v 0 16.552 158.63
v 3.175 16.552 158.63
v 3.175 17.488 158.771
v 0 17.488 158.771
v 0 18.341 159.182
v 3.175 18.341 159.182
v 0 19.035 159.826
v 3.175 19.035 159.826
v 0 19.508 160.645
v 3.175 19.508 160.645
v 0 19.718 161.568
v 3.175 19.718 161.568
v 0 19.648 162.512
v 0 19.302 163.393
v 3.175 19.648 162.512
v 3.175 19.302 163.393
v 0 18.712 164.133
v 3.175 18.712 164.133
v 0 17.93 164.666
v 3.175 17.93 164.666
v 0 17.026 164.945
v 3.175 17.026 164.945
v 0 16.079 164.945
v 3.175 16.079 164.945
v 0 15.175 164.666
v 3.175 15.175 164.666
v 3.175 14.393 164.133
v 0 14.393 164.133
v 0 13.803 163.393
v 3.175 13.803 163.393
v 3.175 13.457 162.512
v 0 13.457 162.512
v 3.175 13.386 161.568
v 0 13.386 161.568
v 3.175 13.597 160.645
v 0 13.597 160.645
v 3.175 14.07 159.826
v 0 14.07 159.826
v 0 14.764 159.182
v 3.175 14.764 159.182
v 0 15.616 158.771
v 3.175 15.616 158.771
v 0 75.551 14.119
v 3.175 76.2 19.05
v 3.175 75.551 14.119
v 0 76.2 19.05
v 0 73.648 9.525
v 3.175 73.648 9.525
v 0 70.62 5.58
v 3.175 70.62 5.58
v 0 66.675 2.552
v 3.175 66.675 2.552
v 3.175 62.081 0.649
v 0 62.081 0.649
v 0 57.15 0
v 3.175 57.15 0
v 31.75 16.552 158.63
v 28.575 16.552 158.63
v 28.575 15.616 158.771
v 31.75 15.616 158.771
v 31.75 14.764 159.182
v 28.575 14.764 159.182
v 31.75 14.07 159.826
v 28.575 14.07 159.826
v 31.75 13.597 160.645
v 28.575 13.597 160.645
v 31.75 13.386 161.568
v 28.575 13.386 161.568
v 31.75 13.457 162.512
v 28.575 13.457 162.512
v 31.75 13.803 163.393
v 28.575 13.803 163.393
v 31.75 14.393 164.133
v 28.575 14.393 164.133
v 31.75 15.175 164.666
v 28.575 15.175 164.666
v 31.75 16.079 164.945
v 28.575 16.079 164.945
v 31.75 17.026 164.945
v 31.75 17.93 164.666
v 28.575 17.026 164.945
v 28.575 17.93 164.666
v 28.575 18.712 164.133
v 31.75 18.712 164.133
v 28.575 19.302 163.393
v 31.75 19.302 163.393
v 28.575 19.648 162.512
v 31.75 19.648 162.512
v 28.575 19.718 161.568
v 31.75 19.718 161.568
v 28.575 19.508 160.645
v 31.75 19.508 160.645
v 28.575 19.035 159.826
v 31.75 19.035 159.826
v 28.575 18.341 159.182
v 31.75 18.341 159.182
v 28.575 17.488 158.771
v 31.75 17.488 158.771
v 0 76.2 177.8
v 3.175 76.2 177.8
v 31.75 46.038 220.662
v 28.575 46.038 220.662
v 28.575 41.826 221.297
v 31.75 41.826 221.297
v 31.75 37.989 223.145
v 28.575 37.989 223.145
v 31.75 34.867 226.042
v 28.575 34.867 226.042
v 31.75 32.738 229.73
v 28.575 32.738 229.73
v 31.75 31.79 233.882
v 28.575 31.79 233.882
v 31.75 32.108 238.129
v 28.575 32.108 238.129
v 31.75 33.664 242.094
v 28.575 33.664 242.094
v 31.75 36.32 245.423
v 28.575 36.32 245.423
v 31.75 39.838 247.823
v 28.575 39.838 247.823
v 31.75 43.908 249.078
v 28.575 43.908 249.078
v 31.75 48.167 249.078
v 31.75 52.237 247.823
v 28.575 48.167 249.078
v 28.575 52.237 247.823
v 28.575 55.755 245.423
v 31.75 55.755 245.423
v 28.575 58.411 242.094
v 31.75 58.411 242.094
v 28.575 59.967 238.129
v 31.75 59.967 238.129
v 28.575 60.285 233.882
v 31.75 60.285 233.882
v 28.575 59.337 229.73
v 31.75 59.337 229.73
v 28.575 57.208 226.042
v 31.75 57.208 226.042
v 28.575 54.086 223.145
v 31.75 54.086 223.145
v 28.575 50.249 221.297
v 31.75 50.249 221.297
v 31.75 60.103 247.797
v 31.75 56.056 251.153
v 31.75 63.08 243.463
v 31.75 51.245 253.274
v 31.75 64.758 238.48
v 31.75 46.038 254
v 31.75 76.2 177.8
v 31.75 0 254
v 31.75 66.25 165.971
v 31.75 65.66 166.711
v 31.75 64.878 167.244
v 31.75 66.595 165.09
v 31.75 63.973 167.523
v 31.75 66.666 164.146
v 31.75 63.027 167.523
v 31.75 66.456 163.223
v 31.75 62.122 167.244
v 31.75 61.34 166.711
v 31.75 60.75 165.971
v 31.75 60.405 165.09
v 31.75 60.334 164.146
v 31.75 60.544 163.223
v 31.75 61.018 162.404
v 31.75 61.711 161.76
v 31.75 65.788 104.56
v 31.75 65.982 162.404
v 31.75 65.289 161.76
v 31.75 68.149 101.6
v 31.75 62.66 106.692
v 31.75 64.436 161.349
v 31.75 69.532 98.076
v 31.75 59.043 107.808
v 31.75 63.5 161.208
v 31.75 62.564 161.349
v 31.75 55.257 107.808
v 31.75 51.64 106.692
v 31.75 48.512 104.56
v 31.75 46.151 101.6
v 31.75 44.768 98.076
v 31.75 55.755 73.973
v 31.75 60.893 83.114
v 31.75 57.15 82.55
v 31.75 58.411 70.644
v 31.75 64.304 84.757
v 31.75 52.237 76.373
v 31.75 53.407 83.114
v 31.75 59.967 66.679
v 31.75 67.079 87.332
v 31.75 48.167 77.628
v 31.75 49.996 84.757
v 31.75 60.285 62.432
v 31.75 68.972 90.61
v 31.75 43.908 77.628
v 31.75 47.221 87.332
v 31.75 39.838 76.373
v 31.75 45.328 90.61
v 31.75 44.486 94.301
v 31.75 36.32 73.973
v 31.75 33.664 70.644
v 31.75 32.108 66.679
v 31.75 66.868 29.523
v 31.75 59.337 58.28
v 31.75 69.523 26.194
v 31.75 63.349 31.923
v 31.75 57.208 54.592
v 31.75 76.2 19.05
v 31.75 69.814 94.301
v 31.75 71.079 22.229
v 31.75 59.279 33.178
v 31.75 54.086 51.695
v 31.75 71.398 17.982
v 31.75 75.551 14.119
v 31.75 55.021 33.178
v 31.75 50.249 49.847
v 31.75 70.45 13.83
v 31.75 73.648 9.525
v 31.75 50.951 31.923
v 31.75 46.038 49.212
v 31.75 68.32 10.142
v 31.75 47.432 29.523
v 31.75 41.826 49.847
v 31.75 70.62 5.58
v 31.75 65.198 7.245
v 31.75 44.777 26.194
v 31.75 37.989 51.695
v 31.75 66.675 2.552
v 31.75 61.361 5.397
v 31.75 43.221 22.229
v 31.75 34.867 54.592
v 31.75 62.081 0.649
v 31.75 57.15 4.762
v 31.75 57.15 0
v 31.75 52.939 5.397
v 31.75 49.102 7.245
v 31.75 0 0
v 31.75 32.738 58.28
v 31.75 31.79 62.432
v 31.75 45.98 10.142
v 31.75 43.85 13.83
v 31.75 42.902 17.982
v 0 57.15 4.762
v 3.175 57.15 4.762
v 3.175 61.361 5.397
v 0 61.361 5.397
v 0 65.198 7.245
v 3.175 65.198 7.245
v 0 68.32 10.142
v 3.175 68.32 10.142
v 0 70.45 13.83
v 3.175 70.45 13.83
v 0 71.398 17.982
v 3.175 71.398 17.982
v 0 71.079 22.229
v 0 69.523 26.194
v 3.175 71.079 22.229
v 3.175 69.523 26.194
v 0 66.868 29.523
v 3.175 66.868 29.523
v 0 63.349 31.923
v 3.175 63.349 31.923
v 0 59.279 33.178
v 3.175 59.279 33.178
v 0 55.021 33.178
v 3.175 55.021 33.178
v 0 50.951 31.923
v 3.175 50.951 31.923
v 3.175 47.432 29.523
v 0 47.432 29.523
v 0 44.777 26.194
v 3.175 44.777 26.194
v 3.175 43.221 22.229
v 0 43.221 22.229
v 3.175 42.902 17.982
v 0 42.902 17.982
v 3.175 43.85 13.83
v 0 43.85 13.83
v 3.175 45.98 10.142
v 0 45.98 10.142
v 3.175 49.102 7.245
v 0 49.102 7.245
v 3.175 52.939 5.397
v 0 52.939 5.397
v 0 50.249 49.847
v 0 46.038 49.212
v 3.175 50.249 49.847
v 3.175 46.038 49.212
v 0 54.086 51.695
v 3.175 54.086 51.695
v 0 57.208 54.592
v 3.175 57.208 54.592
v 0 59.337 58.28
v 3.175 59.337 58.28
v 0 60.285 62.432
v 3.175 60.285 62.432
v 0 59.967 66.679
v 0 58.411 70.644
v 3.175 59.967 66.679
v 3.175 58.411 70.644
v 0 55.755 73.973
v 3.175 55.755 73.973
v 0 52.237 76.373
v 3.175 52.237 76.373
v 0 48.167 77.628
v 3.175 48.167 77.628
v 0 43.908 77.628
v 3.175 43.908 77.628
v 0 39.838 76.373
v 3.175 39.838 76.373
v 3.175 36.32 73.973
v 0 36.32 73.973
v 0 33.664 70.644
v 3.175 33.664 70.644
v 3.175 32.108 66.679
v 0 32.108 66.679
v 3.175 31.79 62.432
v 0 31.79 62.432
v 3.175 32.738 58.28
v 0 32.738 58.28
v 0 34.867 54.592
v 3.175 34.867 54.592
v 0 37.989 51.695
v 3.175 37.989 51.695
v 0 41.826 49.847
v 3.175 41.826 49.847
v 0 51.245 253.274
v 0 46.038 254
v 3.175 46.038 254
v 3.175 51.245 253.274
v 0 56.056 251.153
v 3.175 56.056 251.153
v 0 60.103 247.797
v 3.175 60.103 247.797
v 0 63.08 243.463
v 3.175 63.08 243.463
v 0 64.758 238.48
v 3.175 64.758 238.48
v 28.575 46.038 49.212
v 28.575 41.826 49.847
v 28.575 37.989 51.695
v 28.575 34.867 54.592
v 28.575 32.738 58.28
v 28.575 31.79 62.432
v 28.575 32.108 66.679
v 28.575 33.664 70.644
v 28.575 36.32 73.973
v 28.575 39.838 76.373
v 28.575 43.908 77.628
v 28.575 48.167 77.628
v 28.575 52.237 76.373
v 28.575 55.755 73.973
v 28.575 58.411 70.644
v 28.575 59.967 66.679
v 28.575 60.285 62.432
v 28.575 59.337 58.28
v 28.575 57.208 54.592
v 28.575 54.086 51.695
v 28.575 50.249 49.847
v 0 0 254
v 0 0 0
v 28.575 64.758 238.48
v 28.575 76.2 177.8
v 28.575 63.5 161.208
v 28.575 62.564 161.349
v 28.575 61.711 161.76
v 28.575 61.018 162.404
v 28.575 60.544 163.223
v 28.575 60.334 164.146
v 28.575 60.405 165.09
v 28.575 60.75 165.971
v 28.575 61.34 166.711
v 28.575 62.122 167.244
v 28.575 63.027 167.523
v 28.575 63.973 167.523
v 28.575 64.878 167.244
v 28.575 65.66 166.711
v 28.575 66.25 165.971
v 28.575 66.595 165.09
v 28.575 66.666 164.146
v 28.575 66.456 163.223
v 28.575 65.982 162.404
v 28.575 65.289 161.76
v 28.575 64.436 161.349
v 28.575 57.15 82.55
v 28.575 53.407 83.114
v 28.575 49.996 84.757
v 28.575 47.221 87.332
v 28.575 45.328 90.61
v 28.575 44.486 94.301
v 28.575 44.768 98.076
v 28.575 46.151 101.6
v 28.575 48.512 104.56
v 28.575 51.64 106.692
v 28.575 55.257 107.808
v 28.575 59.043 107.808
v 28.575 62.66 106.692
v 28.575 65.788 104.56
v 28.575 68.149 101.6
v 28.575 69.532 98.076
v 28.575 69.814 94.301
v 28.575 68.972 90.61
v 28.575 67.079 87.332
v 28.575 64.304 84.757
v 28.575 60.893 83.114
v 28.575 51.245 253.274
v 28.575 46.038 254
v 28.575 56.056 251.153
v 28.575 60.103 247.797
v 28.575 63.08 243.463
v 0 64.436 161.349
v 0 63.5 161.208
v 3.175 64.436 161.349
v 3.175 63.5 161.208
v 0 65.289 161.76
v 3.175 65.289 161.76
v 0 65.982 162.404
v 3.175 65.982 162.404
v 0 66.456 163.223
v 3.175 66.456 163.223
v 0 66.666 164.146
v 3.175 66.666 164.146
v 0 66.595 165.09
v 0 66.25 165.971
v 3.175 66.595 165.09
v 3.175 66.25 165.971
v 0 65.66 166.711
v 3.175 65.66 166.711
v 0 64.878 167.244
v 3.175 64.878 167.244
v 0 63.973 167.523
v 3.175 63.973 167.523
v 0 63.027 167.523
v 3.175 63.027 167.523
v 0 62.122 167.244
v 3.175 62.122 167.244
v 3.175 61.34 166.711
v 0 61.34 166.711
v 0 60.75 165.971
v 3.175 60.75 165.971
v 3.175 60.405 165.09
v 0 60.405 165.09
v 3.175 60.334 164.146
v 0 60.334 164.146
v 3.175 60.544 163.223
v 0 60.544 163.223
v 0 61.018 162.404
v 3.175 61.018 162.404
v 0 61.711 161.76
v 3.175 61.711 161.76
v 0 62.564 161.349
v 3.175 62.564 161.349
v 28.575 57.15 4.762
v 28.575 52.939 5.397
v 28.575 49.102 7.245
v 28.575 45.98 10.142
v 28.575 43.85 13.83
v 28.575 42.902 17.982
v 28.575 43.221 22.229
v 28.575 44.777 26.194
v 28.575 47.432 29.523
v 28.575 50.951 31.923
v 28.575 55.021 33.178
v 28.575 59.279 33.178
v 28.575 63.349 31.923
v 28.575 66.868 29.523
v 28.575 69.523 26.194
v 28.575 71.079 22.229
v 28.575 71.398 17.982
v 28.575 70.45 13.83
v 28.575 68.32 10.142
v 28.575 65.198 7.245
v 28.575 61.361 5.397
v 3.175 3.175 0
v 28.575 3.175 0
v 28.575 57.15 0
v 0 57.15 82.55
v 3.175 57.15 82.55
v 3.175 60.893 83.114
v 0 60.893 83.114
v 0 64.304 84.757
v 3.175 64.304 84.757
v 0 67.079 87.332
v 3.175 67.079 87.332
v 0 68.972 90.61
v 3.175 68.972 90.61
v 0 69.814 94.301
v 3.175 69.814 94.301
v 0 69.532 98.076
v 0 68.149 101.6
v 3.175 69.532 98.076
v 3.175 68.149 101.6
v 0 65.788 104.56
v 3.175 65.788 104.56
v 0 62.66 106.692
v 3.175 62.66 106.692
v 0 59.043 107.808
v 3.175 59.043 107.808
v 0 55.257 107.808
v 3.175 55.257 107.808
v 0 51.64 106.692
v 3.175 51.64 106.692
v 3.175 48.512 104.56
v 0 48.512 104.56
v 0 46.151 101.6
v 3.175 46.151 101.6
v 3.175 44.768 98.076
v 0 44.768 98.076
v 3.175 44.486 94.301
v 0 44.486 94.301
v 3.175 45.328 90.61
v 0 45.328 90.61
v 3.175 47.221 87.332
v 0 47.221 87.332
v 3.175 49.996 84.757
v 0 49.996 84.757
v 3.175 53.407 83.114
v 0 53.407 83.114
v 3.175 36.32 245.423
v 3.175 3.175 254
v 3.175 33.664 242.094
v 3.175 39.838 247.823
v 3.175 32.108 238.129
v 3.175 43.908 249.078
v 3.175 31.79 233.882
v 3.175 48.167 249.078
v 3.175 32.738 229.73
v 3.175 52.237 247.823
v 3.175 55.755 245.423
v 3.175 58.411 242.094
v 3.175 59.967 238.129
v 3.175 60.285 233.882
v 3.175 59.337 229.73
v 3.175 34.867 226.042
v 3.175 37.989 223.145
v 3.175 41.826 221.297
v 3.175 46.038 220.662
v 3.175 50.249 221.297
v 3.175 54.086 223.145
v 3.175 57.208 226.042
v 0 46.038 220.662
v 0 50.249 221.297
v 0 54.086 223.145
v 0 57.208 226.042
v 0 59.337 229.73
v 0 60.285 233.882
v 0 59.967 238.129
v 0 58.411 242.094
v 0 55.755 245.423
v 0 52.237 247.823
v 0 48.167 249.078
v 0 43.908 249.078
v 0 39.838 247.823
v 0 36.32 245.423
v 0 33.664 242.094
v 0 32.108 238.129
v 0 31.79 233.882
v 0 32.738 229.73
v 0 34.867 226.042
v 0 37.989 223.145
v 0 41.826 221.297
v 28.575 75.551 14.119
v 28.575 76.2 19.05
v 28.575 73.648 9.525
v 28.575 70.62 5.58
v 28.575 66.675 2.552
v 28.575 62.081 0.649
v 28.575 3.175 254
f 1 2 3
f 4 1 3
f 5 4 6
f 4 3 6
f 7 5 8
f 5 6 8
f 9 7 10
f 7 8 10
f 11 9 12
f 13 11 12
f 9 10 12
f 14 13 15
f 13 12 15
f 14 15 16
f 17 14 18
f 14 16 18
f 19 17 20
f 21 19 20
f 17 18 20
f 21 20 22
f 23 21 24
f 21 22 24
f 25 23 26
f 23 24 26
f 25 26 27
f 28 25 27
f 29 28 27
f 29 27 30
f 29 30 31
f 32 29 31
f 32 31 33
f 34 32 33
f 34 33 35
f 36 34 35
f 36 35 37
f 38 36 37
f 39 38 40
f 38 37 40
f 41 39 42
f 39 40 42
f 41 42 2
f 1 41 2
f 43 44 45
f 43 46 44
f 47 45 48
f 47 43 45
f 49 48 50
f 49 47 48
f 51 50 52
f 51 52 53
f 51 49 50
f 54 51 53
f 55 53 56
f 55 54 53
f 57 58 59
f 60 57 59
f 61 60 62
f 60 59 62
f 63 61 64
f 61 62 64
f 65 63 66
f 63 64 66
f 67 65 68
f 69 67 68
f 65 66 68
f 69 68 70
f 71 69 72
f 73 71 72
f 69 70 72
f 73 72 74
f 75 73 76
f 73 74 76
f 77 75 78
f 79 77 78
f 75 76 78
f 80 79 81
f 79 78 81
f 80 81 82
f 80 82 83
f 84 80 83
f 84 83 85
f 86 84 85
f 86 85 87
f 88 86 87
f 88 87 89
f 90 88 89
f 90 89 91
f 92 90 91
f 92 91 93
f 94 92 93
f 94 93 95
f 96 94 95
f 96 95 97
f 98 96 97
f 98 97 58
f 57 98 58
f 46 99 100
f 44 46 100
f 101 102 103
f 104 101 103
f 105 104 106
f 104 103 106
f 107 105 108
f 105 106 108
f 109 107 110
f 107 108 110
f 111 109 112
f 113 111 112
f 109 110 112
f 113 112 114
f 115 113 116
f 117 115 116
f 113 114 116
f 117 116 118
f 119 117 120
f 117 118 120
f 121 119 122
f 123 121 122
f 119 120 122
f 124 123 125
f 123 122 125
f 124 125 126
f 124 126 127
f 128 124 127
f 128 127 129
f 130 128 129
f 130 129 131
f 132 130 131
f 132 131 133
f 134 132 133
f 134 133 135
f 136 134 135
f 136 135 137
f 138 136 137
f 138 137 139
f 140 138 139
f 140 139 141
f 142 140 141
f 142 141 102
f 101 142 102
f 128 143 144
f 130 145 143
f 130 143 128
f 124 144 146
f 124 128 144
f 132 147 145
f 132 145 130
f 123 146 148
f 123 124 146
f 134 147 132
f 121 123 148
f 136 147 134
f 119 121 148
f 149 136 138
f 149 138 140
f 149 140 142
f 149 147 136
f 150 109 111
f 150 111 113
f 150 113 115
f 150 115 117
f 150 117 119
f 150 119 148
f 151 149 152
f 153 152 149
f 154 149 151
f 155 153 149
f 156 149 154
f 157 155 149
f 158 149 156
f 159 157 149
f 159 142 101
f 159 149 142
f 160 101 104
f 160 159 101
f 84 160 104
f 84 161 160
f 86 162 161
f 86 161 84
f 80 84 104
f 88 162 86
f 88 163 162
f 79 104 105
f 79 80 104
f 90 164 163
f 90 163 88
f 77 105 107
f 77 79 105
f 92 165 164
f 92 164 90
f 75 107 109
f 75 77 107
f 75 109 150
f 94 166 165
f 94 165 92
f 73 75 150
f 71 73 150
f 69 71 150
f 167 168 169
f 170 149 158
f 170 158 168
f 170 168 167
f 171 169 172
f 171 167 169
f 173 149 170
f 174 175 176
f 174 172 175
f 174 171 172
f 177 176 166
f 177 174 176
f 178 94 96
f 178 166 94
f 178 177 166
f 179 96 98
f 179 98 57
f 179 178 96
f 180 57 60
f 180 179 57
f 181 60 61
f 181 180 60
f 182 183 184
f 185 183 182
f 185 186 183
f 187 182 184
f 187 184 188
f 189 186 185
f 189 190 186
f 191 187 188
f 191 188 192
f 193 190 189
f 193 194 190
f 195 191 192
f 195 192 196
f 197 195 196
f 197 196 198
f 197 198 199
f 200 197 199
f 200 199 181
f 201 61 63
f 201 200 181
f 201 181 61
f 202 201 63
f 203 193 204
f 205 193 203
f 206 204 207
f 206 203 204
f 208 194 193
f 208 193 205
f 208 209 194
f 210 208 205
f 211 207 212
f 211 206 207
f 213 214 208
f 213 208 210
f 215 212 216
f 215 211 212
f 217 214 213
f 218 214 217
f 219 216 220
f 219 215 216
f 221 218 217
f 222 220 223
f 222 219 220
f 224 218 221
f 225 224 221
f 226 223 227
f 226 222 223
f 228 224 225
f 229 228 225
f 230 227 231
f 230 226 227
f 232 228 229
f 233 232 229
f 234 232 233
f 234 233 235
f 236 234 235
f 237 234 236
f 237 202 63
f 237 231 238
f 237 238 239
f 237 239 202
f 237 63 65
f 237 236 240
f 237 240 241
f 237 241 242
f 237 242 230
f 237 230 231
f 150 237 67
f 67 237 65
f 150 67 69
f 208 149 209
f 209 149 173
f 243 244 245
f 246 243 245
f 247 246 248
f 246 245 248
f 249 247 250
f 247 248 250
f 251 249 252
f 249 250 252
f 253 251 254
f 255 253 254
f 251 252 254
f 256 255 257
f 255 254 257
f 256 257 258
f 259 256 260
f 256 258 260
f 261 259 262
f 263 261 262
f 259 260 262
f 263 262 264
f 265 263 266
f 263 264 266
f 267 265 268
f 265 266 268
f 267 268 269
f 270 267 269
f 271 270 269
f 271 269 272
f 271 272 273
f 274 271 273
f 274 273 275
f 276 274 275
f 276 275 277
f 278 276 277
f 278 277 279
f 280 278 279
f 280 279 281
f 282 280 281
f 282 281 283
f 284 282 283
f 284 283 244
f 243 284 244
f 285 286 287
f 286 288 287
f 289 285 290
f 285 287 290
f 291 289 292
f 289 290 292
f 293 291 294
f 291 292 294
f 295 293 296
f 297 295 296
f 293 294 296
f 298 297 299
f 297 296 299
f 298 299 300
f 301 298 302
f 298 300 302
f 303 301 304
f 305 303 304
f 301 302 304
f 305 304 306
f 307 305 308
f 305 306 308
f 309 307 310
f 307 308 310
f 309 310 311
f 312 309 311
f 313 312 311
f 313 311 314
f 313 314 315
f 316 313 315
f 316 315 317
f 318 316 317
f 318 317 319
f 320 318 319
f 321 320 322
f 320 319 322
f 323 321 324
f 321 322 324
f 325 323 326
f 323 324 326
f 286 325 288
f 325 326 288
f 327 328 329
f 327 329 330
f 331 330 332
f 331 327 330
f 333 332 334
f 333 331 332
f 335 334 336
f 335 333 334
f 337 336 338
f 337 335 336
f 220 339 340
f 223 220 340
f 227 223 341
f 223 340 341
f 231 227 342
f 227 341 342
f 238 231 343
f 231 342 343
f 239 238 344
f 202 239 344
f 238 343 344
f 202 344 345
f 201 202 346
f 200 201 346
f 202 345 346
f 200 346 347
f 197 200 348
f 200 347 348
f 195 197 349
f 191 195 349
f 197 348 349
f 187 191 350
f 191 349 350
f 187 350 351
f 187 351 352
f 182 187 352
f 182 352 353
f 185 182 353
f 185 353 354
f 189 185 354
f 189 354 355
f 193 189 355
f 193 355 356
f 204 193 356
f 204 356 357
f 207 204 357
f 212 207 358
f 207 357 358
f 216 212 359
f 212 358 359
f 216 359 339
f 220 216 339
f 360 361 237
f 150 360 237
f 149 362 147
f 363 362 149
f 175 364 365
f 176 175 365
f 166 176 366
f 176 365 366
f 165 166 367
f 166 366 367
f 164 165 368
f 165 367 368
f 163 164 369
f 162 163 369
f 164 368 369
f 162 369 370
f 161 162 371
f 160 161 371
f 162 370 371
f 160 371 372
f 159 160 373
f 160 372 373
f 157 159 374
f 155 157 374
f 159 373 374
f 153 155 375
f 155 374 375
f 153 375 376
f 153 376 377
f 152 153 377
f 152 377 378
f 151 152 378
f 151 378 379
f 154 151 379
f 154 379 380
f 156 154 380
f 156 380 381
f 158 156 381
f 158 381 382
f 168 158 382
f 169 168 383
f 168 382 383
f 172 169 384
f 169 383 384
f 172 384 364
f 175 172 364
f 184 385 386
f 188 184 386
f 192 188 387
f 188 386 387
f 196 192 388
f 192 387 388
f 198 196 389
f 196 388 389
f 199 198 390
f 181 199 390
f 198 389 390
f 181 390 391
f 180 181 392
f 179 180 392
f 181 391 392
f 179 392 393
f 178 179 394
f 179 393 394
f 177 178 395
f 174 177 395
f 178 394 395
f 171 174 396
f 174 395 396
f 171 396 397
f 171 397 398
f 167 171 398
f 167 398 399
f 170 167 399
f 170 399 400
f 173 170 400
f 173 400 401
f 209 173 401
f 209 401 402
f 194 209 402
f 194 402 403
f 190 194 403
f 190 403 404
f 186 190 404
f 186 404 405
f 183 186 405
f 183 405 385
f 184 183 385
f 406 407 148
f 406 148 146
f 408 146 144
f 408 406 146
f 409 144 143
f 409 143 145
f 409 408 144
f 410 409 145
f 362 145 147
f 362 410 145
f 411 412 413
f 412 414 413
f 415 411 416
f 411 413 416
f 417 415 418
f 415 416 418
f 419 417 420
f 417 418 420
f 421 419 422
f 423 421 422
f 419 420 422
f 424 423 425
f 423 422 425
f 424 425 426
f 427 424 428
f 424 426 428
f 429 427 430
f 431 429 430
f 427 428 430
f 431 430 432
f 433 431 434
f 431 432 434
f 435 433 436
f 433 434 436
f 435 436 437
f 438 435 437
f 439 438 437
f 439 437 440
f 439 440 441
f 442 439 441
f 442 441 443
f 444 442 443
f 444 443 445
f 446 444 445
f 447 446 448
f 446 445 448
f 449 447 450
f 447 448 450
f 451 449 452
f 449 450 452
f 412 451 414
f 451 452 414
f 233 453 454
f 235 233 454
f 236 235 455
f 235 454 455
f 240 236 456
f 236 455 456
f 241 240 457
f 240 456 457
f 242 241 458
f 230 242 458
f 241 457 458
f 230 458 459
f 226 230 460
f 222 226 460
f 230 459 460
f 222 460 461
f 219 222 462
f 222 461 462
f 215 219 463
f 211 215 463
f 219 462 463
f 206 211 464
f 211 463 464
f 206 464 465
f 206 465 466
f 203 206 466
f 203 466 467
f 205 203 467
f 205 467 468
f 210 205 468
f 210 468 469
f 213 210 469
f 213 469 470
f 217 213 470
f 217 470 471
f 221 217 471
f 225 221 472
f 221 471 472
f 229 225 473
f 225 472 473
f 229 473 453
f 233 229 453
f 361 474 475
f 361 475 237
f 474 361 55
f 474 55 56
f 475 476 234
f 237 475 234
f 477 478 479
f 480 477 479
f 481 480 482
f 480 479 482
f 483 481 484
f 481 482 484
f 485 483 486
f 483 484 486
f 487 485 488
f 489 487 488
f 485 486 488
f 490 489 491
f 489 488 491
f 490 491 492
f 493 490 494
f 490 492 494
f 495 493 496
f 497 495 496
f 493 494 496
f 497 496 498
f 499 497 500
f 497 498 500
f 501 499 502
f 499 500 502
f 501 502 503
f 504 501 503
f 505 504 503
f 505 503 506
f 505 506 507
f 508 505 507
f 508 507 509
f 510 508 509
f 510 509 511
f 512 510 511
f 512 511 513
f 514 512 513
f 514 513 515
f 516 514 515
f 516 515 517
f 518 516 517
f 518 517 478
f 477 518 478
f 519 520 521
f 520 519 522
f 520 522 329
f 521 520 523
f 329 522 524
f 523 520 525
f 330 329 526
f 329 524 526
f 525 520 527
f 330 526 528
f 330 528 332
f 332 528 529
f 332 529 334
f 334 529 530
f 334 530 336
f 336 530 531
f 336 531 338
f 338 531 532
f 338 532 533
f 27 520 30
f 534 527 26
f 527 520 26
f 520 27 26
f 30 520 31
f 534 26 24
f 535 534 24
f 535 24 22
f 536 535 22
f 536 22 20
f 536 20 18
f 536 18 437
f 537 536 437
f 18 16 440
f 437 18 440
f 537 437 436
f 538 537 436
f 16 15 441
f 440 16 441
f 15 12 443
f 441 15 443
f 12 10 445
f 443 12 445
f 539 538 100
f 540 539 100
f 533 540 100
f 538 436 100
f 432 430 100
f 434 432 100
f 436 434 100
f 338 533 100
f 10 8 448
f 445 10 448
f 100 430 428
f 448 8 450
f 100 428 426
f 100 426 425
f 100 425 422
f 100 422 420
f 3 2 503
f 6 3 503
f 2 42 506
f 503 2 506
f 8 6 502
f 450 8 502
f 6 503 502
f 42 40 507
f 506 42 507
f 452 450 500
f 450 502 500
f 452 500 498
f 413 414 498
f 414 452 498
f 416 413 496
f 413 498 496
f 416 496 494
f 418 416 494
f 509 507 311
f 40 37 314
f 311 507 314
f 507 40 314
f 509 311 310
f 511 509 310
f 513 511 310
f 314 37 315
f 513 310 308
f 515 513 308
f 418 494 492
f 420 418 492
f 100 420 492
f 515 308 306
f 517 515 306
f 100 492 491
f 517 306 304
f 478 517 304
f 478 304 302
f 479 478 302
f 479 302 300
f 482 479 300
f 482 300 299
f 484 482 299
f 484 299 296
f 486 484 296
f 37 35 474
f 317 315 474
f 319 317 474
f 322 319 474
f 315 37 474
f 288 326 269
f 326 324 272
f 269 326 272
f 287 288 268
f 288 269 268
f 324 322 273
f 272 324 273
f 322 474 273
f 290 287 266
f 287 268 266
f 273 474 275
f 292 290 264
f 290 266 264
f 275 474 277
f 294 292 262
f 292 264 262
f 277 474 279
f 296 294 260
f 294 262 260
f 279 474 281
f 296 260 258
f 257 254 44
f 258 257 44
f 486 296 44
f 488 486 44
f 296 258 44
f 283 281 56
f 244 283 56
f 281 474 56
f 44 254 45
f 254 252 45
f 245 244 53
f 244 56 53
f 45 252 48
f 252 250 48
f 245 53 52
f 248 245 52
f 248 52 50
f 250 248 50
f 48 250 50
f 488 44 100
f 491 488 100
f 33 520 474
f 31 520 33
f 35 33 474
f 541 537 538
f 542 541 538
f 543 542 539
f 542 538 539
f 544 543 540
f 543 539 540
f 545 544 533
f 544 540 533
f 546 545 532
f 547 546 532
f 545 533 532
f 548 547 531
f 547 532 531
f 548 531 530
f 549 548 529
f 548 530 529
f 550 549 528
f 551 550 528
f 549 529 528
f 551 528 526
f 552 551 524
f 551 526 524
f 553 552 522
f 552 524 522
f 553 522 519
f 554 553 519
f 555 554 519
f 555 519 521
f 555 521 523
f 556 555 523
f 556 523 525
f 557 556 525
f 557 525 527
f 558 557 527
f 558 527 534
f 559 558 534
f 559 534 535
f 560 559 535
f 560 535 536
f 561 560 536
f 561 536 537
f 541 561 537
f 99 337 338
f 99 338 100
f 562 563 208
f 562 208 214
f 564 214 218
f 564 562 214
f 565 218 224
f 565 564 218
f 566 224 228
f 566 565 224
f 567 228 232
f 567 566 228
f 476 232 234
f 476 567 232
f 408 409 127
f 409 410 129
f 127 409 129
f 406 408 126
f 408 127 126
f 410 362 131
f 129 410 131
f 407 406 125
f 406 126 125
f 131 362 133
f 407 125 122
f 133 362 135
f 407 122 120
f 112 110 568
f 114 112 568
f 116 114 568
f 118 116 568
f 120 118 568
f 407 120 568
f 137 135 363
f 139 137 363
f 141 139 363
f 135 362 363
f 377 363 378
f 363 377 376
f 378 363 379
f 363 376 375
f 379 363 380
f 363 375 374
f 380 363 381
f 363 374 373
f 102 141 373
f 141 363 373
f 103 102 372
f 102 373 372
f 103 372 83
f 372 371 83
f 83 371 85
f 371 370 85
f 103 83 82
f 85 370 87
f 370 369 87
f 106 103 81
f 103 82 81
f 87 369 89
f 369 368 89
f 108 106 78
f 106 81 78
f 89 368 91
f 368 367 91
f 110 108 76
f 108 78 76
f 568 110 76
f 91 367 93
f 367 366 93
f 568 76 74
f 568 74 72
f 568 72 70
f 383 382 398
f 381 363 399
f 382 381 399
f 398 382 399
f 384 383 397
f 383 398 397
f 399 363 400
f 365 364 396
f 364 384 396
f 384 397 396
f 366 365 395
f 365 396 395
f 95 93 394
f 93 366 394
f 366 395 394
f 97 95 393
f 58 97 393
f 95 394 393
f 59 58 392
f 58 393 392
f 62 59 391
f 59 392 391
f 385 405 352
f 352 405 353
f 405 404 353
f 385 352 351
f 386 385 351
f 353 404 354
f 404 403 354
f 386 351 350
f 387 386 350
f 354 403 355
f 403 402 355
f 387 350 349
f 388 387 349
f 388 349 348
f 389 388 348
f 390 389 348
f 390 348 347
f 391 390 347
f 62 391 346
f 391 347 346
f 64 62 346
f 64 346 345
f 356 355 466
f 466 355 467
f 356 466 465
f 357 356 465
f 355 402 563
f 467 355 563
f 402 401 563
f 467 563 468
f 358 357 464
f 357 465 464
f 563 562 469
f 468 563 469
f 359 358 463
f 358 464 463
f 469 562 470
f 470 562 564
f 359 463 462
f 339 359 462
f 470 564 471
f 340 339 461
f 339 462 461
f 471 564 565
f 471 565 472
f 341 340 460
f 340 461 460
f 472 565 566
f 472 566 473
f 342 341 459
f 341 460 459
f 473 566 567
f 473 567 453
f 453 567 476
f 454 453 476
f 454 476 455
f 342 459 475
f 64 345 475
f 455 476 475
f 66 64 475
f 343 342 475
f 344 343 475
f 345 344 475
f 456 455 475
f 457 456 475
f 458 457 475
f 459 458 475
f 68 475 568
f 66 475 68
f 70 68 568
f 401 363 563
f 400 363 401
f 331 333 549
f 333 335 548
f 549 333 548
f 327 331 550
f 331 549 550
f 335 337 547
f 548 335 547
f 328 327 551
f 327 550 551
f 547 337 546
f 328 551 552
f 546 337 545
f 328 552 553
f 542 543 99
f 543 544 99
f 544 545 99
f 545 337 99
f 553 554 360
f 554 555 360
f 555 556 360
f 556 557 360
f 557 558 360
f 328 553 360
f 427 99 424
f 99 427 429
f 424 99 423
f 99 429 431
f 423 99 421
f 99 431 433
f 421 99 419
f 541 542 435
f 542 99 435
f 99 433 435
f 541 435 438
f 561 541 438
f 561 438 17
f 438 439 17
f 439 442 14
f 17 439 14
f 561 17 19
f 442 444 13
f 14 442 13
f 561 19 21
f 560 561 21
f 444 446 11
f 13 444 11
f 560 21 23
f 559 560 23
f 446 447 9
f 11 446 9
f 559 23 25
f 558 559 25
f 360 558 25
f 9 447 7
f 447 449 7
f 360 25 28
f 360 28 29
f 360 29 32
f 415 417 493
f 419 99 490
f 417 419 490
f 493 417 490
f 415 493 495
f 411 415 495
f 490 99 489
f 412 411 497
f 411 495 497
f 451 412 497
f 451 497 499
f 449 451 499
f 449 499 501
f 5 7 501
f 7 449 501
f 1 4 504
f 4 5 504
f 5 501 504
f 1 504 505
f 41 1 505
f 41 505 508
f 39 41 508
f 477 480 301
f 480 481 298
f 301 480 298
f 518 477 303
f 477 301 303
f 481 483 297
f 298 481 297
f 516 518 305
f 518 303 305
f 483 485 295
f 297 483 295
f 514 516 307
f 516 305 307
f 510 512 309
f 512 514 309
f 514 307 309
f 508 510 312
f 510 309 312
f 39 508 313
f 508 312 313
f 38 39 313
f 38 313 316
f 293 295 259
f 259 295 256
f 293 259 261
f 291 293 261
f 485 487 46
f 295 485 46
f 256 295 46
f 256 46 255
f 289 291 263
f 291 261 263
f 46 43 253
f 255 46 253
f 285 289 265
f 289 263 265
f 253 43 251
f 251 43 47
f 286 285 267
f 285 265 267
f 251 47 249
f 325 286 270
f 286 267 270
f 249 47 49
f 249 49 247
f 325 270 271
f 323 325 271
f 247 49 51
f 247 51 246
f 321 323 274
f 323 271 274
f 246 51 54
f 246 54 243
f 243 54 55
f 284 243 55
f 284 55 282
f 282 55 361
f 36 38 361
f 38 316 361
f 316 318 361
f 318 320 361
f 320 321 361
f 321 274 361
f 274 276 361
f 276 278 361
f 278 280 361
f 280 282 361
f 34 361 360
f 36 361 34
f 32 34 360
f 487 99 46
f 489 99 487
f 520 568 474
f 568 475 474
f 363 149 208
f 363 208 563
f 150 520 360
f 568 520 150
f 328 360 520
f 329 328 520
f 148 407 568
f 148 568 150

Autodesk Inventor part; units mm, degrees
ref_plane "YZ Plane" through (0, 0, 0) normal (1, 0, 0) x (0, 1, 0)
ref_plane "XZ Plane" through (0, 0, 0) normal (0, 1, 0) x (-1, 0, 0)
ref_plane "XY Plane" through (0, 0, 0) normal (0, 0, 1) x (1, 0, 0)
sketch "Sketch1" plane through (0, 0, 0) normal (0, 0, 1) x (1, 0, 0)
  line L0 (0, 0) -> (31.75, 0)
  line L1 (0, 76.2) -> (0, 0)
  line L2 (3.175, 3.175) -> (3.175, 76.2)
  line L3 (0, 76.2) -> (3.175, 76.2)
  line L4 (31.75, 76.2) -> (31.75, 0)
  line L5 (31.75, 76.2) -> (28.575, 76.2)
  line L6 (28.575, 76.2) -> (28.575, 3.175)
  line L7 (28.575, 3.175) -> (3.175, 3.175)
  dimension "d0" = 76.2
  dimension "d1" = 31.75
  dimension "d2" = 3.175
  dimension "d20" = 3.175
  dimension "d21" = 3.175
extrude "Extrusion1" add sketch "Sketch1" along normal blind 254
sketch "Sketch2" plane through (3.175, 3.175, 0) normal (1, 0, 0) x (0, 0, -1)
  line L0 (-254, 73.025) -> (-254, 0) projected
  line L1 (0, 73.025) -> (-254, 73.025) projected
  line L2 (0, 73.025) -> (-254, 73.025) projected
  line L3 (0, -3.175) -> (-254, -3.175) projected
  line L4 (-254, 0) -> (-254, -3.175) projected
  line L5 (0, -3.175) -> (0, 0) projected
  circle A0 centre (-164.3834, 60.325) radius 3.175
  line L6 (0, 0) -> (0, 73.025) projected
  arc A1 (0, 53.975) -> (-19.05, 73.025) centre (-19.05, 53.975) ccw
  circle A2 centre (-19.05, 53.975) radius 14.2875
  line L7 (0, 0) -> (-254, 0) projected
  line L8 (-177.8, 73.025) -> (-173.7896, 0) construction
  line L9 (-173.7896, 0) -> (-148.4278, 1.3928) construction
  line L10 (-148.4278, 1.3928) -> (-152.3617, 73.025) construction
  circle A3 centre (-161.8051, 13.3773) radius 3.175
  circle A4 centre (-95.25, 53.975) radius 12.7
  circle A5 centre (-234.95, 42.8625) radius 14.2875
  circle A6 centre (-19.05, 53.975) radius 38.1 construction
  circle A7 centre (-63.5, 42.8625) radius 14.2875
  arc A8 (-238.48, 61.5826) -> (-254, 42.8625) centre (-234.95, 42.8625) ccw
  line L11 (-238.48, 61.5826) -> (-177.8, 73.025)
  dimension "d8" = 76.2
  dimension "d9" = 12.7
  dimension "d13" = 6.35
  dimension "d17" = 19.05
  dimension "d18" = 28.575
  dimension "d22" = 25.4
  dimension "d23" = 12.7
  dimension "d24" = 12.7
  dimension "d25" = 12.7
  dimension "d26" = 6.35
  dimension "d27" = 12.7
  dimension "d28" = 76.2
  dimension "d29" = 25.4
  dimension "d30" = 28.575
  dimension "d31" = 46.0375
  dimension "d32" = 19.05
  dimension "d33" = 76.2
  dimension "d34" = 28.575
  dimension "d35" = 63.5
extrude "Extrusion2" cut sketch "Sketch2" along normal through all both and the other way through all contours L1 L11 A8 L0 | L1 L6 A1 | A0 | A2 | A3 | A4 | A5 | A7
equation "\"d20\" = d2"
equation "\"d21\" = d20"
equation "\"d23\" = 0.5 * d22"
equation "\"d24\" = d23"
equation "\"d26\" = d13"
equation "\"d34\" = d30"
properties part number "apendage L bracket left"
